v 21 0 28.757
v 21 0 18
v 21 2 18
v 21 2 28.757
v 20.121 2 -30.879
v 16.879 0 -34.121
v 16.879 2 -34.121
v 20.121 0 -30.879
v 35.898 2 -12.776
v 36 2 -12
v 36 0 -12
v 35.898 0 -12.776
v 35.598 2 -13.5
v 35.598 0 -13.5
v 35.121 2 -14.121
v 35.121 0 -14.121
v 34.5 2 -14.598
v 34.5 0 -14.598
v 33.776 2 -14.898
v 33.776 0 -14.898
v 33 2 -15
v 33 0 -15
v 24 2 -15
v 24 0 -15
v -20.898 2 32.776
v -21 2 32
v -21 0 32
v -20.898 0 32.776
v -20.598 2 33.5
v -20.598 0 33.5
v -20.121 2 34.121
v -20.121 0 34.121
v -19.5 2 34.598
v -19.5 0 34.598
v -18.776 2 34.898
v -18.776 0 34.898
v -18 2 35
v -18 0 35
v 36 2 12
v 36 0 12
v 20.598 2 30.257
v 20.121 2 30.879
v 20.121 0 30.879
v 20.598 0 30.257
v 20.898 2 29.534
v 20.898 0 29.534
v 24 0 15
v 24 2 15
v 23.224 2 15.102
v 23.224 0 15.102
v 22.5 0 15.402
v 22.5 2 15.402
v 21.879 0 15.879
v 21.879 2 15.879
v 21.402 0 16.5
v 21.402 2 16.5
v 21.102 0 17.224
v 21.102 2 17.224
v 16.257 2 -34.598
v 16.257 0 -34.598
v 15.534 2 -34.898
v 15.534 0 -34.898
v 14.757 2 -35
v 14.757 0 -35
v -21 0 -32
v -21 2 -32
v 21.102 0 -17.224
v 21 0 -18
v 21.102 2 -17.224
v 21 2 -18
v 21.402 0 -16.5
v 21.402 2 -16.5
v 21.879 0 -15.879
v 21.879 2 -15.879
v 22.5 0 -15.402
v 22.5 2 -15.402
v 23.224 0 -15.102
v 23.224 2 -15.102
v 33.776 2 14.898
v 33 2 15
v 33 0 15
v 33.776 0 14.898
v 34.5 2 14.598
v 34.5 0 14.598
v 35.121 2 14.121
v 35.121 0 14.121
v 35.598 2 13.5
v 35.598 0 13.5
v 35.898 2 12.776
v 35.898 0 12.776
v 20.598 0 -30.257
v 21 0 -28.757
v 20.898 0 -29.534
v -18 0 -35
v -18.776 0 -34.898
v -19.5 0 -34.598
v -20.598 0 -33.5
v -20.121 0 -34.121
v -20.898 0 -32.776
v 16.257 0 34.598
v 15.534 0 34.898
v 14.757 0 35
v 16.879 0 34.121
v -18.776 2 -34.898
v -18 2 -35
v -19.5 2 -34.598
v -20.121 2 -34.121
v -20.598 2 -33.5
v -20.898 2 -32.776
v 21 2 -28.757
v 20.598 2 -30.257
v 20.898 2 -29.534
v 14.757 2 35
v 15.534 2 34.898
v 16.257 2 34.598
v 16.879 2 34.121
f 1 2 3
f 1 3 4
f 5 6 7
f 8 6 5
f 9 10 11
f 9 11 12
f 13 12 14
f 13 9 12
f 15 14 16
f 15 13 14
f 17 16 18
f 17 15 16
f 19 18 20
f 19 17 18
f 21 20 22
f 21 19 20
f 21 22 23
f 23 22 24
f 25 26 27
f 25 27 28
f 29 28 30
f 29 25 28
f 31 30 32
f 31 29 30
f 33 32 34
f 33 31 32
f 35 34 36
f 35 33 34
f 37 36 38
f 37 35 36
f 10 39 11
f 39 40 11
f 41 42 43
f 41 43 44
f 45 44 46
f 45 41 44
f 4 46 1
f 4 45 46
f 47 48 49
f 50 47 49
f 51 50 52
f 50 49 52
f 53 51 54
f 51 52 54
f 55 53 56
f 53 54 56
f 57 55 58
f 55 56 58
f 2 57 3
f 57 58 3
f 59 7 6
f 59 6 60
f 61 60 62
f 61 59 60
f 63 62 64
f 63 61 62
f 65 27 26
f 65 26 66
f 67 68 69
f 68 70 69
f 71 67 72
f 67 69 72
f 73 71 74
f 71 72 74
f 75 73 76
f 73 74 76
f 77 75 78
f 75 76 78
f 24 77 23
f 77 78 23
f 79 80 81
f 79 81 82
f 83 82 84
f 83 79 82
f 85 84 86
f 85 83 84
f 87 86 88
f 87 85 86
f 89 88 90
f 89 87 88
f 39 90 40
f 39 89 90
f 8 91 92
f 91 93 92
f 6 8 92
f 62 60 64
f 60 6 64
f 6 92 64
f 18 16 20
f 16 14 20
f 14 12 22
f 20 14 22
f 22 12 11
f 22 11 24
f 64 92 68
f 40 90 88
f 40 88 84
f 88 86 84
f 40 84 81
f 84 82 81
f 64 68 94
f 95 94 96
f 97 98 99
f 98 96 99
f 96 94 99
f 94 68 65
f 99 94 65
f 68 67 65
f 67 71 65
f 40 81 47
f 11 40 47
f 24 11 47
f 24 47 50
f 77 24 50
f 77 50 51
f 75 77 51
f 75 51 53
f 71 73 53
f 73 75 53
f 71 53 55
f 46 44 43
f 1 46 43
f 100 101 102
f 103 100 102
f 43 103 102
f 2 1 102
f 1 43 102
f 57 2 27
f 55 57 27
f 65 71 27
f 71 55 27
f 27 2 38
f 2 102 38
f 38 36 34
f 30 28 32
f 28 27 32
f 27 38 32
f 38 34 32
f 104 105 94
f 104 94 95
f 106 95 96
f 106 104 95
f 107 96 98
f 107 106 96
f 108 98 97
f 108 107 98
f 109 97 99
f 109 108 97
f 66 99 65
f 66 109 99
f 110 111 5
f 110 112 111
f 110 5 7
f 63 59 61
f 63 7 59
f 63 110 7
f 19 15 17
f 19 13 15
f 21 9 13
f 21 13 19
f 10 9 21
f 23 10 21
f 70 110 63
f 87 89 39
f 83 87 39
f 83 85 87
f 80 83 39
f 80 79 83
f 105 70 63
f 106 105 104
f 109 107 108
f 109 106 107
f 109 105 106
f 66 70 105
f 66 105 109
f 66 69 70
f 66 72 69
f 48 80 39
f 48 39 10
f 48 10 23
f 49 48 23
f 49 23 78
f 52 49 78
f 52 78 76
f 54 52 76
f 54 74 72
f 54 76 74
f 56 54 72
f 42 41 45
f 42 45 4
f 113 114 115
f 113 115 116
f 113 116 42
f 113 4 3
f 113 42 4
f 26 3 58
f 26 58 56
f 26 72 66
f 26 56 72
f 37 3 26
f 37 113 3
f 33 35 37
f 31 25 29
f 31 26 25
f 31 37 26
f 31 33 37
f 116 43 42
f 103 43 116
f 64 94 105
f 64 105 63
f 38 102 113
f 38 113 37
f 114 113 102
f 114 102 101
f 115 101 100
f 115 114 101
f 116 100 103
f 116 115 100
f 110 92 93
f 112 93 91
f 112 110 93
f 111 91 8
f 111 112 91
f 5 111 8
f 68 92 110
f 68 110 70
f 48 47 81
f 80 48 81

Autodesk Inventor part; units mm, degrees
ref_plane "YZ Plane" through (0, 0, 0) normal (1, 0, 0) x (0, 1, 0)
ref_plane "XZ Plane" through (0, 0, 0) normal (0, 1, 0) x (-1, 0, 0)
ref_plane "XY Plane" through (0, 0, 0) normal (0, 0, 1) x (1, 0, 0)
sketch "Sketch1" plane through (0, 0, 0) normal (0, 1, 0) x (-1, 0, 0)
  line L0 (-16, 35) -> (21, 35)
  line L1 (21, 35) -> (21, -35)
  line L2 (21, -35) -> (-16, -35)
  line L3 (-21, -30) -> (-21, 30)
  line L4 (-21, 35) -> (21, -35) construction
  line L5 (21, 35) -> (-21, -35) construction
  line L6 (-36, -15) -> (-6, -15)
  line L7 (-6, -15) -> (-6, 15)
  line L8 (-6, 15) -> (-36, 15)
  line L9 (-36, 15) -> (-36, -15)
  line L10 (-36, -15) -> (-6, 15) construction
  line L11 (-6, -15) -> (-36, 15) construction
  line L12 (-16, -35) -> (-21, -30)
  line L13 (-21, 30) -> (-16, 35)
  point P0 (0, 0)
  point P1 (-21, 0)
  point P2 (-21, -15)
  point P3 (-21, 15)
  dimension "d0" = 42
  dimension "d1" = 70
  dimension "d10" = 30
  dimension "d11" = 30
  dimension "d12" = 5
  dimension "d13" = 5
  dimension "d14" = 5
  dimension "d15" = 5
extrude "Extrusion1" add sketch "Sketch1" along normal blind 2
fillet "Fillet1" radius 3 10 edges at (36, 1, -15) (36, 1, 15) (21, 1, -30) (16, 1, -35) (21, 1, 30) (16, 1, 35) (-21, 1, 35) (-21, 1, -35) (21, 1, -15) (21, 1, 15)
equation "\"d13\" = d12"
equation "\"d14\" = d12"
equation "\"d15\" = d14"
properties part number "Second Layer Board"
